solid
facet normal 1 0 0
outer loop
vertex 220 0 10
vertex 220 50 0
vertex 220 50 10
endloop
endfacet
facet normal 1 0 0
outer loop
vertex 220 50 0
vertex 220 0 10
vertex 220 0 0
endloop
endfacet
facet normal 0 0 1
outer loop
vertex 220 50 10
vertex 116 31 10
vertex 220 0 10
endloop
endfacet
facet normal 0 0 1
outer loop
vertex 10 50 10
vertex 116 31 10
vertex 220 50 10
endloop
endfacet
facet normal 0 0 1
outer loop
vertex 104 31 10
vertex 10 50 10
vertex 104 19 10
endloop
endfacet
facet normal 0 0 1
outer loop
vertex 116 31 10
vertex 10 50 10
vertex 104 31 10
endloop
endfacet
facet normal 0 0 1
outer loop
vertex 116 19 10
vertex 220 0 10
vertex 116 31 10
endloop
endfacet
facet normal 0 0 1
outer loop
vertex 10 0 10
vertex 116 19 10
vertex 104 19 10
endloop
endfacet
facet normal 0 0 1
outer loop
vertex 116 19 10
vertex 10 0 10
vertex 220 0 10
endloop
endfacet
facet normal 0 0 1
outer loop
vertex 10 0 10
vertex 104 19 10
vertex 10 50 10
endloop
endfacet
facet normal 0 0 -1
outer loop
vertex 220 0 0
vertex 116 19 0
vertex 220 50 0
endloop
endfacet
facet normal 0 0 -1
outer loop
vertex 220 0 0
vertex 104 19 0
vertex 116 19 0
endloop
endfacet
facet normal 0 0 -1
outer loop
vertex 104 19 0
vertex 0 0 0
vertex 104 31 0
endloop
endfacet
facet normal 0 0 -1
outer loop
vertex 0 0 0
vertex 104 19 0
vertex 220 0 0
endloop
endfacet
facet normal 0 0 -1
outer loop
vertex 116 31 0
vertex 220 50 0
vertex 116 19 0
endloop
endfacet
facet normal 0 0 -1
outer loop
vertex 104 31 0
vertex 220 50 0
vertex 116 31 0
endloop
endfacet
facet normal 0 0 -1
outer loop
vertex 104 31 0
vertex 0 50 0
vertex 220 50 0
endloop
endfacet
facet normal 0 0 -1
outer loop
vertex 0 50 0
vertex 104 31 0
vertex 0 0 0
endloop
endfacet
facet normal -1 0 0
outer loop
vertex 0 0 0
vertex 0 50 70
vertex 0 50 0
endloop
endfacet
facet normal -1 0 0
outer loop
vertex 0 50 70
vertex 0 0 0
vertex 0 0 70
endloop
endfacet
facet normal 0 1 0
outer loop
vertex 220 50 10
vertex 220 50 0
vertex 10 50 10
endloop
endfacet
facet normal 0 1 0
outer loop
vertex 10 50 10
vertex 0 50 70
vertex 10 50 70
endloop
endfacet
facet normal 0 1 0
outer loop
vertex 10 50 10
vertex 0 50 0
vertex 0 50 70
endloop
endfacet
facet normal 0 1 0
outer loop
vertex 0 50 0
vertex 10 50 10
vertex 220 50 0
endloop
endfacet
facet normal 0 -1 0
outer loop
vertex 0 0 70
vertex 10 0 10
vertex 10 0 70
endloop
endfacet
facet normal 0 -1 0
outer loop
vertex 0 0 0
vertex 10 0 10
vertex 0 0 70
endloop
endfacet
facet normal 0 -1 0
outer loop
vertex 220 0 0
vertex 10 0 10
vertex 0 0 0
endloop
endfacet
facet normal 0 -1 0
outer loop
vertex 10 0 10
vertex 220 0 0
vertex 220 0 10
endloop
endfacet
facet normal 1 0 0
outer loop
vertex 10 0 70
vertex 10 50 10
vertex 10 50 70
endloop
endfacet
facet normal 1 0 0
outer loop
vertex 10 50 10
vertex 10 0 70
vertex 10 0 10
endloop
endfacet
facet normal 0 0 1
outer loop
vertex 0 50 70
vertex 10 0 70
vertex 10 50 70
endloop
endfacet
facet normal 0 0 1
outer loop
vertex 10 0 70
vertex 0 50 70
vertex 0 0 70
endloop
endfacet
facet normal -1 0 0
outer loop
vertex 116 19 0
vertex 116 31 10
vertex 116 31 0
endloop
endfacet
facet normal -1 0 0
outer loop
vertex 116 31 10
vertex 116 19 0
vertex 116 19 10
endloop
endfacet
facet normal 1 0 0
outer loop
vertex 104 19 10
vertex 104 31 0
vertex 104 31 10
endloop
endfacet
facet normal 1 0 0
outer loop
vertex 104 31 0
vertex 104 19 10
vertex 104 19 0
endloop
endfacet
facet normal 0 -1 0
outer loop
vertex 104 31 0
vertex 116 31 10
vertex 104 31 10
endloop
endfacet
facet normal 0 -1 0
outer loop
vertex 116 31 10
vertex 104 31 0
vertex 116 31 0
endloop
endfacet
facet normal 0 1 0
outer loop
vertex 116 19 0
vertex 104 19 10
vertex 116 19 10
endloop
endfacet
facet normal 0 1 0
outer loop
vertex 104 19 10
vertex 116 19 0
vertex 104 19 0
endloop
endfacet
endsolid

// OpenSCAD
$fn = 32;

// ----------------------------------------------------------------------
// Gantry bracket: 200-250 mm L bracket
// ----------------------------------------------------------------------

// --- parameters (mm) ---
base_l = 220;             // base arm length, X
arm_w = 50;               // arm width, Y
thick = 10;               // arm thickness
up_h = 60;                // vertical arm height, Z
slot_w = 12;              // adjustment slot width in the base

total_h = up_h + thick;  // overall height

difference() {
  union() {
    cube([base_l, arm_w, thick]);
    cube([thick, arm_w, total_h]);
  }
  translate([base_l / 2 - slot_w / 2, arm_w / 2 - slot_w / 2, -1])
    cube([slot_w, slot_w, thick + 2]);
}
